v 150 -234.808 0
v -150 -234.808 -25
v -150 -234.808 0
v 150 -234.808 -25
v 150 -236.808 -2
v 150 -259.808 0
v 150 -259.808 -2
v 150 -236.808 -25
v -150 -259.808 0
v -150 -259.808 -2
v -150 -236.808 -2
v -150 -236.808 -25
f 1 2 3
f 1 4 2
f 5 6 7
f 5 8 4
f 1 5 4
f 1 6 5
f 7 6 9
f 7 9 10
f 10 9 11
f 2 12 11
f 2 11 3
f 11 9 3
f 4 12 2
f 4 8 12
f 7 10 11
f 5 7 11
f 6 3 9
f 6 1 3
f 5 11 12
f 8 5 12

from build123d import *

# Parameters (mm, degrees)
F2_DEPTH = 150


with BuildPart() as f2:
    # F1 (on Right) → F2 (new body, through all)
    with BuildSketch(Plane.YZ):
        Polygon((-234.807621, 0), (-259.807621, 0), (-259.807621, -2), (-236.807621, -2), (-236.807621, -25), (-234.807621, -25), align=None)
    extrude(amount=F2_DEPTH)

    # F3: F2 across plane


with BuildPart() as f2_1:
    add(f2.part)
    add(f2.part.mirror(Plane.YZ))


solid = f2_1.part
